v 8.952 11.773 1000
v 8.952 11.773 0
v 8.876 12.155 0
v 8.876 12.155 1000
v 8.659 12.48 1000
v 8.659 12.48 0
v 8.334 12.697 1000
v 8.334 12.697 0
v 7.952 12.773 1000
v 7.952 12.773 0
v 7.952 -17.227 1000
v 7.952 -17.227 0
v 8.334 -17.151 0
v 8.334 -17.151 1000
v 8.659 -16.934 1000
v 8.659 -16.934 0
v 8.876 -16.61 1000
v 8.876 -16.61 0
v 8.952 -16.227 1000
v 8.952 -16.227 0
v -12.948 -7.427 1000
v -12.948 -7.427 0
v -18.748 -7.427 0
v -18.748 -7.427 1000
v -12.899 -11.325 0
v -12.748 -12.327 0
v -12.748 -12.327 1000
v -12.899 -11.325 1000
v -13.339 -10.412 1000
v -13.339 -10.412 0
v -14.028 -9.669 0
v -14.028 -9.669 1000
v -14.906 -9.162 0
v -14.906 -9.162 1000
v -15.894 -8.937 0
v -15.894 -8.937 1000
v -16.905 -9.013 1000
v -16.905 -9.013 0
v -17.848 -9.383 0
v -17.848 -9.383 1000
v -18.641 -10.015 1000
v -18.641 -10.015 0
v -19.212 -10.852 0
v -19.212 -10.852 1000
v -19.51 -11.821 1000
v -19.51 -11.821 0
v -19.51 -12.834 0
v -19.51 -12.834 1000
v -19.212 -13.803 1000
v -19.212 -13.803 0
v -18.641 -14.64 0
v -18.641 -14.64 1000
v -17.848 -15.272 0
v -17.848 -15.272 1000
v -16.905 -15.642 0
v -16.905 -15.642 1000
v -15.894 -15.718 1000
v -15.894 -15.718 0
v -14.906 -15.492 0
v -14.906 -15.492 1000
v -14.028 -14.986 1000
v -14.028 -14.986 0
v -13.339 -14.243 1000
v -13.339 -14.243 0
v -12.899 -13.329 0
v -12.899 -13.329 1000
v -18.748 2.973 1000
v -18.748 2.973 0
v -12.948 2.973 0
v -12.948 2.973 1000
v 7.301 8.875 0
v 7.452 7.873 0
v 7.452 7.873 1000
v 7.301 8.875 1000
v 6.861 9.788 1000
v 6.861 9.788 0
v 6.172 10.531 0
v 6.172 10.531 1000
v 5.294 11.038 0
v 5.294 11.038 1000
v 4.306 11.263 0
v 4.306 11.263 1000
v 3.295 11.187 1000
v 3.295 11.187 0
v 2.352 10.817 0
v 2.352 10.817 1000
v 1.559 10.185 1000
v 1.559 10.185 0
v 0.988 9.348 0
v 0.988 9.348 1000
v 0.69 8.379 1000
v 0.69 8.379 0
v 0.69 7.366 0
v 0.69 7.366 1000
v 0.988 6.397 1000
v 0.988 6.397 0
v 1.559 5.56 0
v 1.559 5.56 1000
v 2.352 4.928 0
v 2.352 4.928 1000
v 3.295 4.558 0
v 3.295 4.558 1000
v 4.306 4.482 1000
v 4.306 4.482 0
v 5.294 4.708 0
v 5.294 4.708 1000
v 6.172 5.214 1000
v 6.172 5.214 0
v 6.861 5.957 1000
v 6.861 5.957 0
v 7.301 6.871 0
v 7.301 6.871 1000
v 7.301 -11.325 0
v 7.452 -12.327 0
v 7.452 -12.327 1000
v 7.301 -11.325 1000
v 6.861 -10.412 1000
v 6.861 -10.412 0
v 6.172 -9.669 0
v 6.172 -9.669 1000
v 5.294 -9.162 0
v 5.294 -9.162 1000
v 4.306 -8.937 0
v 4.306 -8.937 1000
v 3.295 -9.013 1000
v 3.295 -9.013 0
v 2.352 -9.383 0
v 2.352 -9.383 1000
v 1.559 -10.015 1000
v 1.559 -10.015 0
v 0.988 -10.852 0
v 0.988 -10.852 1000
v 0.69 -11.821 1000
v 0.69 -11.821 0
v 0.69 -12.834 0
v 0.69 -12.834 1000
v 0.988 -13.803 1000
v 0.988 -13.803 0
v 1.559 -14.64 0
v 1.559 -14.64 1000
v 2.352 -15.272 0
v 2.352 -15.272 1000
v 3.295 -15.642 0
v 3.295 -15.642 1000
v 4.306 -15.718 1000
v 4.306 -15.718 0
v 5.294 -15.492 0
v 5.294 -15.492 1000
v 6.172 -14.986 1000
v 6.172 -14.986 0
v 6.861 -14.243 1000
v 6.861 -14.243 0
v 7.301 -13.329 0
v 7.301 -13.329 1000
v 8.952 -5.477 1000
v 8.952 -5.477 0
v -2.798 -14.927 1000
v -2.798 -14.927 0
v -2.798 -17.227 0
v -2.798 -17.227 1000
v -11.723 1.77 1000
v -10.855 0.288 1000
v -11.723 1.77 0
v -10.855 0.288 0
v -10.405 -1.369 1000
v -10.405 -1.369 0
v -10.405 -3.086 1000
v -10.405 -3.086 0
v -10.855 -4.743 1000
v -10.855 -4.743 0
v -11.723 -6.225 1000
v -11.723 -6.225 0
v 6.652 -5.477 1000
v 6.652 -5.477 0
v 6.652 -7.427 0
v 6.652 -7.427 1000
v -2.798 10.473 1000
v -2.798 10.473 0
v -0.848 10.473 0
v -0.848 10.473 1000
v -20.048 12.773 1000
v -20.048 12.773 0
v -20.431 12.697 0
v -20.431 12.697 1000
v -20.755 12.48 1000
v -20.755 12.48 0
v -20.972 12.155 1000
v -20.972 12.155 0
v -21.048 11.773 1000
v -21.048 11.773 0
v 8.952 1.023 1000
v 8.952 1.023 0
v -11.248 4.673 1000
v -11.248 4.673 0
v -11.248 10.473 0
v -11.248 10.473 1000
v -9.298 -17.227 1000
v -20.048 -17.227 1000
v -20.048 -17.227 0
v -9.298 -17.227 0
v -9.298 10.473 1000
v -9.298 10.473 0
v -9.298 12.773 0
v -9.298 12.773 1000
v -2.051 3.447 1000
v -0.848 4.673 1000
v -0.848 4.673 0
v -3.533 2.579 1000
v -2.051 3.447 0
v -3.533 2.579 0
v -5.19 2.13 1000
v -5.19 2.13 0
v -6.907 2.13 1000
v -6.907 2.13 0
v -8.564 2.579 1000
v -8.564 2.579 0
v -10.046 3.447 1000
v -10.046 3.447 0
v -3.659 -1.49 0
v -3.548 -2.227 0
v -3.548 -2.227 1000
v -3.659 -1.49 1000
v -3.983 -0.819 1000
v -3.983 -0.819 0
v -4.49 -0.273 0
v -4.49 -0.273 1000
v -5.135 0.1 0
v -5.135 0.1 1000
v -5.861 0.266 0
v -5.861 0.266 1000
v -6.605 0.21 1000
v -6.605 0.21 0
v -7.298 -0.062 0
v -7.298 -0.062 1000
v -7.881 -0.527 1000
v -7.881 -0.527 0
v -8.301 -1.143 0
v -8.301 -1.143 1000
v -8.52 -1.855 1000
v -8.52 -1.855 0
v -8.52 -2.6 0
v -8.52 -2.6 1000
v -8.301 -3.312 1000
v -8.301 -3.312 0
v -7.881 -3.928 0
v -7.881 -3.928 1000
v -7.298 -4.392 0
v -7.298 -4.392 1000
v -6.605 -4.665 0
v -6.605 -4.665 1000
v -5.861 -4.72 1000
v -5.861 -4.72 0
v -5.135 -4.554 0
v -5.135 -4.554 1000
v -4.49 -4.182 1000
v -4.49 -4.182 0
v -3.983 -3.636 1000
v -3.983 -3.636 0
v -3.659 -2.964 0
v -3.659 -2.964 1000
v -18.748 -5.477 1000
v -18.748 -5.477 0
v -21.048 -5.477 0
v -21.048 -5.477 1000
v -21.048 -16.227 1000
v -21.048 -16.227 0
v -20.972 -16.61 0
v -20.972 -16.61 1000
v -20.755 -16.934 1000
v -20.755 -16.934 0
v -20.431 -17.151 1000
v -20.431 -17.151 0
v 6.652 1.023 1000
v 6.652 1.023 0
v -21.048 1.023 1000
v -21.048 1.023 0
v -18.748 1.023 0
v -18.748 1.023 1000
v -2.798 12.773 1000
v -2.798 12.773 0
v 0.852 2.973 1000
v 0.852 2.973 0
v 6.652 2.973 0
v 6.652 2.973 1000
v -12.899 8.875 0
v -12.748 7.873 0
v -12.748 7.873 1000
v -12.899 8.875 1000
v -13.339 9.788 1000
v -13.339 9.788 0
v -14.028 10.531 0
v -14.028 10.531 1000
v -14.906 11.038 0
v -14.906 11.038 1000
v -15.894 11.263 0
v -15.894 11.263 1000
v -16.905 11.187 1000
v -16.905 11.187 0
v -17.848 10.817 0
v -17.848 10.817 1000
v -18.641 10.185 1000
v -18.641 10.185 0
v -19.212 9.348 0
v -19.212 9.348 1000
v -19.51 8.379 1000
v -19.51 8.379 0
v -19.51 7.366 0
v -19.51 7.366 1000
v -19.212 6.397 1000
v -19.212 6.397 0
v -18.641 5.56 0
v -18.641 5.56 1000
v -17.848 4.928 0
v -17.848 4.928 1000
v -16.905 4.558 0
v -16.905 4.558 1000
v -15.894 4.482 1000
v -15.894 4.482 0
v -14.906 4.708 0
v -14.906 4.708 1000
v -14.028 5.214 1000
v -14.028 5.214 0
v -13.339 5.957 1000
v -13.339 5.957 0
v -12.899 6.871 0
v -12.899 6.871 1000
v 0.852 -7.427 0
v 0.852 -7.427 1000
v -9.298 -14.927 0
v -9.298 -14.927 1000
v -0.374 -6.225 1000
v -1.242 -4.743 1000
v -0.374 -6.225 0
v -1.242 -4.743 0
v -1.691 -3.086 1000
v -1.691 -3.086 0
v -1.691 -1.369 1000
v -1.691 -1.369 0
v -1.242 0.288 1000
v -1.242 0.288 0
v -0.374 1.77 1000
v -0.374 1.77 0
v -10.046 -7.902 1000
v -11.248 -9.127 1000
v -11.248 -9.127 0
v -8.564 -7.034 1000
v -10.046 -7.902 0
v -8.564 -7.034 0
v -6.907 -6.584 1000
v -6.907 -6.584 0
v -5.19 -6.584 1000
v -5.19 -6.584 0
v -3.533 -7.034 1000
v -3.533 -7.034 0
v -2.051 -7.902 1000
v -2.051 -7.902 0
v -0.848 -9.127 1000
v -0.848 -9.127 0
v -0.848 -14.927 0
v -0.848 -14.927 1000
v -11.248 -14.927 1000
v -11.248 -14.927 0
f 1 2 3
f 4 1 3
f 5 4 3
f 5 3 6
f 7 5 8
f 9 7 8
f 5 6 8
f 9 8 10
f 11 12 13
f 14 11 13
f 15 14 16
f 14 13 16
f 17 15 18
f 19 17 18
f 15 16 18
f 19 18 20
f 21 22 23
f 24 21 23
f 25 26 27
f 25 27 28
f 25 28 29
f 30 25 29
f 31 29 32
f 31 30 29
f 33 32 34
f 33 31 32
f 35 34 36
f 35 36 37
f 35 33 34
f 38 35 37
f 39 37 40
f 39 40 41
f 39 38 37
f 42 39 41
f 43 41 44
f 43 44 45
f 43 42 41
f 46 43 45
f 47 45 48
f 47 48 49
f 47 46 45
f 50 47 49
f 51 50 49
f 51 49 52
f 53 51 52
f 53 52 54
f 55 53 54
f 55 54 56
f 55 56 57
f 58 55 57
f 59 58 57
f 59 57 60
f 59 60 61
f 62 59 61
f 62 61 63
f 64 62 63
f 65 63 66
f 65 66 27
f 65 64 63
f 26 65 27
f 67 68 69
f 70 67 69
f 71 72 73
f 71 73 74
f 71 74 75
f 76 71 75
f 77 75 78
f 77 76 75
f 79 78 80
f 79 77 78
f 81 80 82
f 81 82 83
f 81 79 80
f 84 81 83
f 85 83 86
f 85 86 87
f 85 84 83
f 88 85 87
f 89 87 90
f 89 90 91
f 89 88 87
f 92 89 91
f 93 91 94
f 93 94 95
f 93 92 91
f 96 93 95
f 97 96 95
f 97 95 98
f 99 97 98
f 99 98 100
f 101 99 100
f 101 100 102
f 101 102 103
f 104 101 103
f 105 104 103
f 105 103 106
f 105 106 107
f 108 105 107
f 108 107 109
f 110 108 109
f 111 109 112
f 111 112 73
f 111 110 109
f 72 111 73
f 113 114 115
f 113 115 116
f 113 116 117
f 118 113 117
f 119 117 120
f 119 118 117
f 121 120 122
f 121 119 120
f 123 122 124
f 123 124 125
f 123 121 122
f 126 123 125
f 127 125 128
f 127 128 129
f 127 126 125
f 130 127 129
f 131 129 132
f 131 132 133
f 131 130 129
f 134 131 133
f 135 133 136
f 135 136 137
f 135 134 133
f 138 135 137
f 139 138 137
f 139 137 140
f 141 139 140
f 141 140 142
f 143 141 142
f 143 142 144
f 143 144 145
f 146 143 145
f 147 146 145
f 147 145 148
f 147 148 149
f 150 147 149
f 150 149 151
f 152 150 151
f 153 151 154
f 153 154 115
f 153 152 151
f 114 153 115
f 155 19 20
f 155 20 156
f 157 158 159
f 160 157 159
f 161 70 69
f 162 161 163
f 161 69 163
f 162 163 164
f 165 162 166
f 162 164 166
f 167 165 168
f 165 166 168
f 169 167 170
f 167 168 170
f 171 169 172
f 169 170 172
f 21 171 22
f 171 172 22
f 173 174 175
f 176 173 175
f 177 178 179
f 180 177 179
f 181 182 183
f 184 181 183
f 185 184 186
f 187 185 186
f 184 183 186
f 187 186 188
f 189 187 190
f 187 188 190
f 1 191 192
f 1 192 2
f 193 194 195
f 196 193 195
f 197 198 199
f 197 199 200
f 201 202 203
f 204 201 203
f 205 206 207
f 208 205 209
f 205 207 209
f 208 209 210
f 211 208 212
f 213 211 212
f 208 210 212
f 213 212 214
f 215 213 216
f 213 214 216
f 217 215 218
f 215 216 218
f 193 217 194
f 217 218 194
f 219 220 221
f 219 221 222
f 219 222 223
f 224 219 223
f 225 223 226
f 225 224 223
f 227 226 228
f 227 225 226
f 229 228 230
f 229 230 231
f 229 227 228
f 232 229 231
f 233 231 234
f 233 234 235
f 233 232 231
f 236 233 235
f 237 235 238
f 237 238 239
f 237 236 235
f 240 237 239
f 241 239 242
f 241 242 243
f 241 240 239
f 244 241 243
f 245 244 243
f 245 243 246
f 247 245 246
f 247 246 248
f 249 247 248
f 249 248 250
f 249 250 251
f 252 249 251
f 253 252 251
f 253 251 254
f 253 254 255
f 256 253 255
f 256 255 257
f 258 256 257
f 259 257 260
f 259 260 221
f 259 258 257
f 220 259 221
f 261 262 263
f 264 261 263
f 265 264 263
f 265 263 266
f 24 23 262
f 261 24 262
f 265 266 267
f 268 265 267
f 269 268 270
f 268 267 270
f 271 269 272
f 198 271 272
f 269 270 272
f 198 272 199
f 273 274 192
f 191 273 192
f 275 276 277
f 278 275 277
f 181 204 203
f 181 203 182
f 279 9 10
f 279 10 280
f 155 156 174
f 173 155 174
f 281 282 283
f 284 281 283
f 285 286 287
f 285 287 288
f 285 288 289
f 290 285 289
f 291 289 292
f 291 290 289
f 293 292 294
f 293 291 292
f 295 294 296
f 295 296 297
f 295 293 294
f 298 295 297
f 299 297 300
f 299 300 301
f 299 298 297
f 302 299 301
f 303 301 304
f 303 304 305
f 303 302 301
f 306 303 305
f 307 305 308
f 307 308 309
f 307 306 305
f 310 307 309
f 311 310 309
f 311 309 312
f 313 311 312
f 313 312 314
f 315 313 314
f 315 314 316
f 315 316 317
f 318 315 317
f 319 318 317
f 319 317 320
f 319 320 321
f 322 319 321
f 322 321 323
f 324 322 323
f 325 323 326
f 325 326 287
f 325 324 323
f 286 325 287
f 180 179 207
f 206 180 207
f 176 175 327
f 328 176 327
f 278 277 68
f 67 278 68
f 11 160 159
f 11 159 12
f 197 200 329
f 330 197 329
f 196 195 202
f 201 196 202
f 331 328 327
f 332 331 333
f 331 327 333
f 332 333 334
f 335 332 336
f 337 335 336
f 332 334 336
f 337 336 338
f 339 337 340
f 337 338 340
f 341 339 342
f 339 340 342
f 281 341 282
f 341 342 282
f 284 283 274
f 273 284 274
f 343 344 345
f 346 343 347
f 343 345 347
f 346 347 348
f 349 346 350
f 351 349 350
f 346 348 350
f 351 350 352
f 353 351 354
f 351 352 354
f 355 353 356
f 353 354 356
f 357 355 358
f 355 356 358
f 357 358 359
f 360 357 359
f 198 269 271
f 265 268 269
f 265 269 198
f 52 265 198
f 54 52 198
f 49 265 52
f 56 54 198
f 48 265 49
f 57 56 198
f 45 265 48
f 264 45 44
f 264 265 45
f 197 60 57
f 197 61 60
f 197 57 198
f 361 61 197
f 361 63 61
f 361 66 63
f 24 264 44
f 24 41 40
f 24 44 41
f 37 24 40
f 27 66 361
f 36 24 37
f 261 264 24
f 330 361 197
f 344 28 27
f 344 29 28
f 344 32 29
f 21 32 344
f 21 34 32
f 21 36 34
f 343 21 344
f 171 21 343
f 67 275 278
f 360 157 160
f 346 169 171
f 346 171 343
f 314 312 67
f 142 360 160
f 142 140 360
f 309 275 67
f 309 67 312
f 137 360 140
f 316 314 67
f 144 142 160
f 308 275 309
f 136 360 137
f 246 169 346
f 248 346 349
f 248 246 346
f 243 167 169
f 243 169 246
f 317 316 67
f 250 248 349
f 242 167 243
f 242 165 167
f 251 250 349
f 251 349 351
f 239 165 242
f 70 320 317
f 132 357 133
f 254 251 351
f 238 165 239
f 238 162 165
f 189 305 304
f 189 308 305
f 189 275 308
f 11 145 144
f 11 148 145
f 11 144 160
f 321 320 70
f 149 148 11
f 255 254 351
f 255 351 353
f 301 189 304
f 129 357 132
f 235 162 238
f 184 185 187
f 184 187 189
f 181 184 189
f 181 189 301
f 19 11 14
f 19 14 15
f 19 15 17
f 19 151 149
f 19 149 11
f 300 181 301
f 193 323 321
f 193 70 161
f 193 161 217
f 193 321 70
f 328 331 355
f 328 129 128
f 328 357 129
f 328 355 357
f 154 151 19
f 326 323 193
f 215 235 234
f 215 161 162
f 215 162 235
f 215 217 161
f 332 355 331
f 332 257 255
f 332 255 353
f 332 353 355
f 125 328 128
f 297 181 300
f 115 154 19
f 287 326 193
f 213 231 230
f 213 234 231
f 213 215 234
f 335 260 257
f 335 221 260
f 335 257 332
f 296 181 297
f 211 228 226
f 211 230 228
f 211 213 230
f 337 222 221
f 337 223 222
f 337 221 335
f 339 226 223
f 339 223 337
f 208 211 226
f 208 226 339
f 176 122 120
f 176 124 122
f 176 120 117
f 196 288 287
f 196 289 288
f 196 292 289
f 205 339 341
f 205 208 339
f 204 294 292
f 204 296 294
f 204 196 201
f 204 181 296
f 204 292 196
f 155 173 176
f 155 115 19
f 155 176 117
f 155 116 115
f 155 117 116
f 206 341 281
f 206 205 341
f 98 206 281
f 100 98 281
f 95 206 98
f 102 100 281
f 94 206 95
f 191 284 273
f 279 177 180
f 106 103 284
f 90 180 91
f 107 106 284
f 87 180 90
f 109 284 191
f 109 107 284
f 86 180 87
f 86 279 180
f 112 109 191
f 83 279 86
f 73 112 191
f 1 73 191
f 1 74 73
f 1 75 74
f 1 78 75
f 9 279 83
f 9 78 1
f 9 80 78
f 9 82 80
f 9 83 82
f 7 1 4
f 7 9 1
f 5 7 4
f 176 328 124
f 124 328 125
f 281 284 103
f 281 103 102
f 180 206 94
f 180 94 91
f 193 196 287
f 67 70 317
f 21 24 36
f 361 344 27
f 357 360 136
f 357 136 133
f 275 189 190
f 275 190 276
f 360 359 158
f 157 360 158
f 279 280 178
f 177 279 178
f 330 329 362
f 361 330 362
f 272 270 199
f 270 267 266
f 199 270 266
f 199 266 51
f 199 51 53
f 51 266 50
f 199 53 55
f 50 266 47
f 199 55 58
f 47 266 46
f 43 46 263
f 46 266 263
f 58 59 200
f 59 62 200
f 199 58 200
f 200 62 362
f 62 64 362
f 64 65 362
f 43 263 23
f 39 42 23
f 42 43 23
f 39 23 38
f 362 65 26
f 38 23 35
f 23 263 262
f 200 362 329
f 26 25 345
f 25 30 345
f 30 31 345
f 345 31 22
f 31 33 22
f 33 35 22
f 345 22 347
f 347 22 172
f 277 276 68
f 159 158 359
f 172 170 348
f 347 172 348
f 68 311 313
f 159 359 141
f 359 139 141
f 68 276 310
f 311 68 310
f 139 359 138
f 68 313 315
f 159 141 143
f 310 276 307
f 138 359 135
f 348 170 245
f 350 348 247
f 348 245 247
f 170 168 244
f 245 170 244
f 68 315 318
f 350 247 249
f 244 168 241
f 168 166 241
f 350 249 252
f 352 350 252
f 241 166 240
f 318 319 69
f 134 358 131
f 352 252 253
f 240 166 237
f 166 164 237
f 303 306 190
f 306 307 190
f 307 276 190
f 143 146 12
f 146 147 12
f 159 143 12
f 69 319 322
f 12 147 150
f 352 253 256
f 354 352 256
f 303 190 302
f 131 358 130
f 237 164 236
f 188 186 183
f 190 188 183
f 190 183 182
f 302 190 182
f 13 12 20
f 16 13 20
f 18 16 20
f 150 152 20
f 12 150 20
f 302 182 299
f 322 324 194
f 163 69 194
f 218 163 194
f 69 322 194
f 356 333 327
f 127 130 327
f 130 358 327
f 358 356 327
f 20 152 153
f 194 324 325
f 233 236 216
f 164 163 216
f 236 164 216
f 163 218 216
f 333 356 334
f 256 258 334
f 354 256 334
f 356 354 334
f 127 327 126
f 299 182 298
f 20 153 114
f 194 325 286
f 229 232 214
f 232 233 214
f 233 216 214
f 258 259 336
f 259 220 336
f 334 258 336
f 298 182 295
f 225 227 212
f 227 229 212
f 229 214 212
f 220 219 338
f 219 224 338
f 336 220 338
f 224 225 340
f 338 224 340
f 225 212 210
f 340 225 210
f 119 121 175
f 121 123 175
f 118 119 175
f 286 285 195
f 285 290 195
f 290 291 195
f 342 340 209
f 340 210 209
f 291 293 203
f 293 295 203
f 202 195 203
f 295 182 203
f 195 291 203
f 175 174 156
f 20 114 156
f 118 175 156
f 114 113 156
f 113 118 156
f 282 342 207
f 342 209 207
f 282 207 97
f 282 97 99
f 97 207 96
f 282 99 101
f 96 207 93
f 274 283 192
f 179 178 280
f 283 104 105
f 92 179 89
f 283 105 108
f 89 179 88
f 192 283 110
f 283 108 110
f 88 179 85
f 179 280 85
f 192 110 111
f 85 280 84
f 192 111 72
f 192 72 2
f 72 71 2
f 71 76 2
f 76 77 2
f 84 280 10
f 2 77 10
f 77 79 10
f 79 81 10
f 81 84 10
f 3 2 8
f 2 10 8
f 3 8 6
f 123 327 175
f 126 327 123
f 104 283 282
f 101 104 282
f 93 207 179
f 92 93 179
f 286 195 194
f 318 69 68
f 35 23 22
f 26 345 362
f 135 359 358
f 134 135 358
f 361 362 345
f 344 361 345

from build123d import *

# Parameters (mm, degrees)
SKETCH_1_R      = 2.5
SKETCH_1_R_2    = 3.4
EXTRUDE_1_DEPTH = 1000


with BuildPart() as part:
    # 草图1 → 凸台-拉伸1 (new body)
    with BuildSketch(Plane.XY):
        with BuildLine():
            Line((-2.798233949, -17.227303989), (7.951766051, -17.227303989))
            ThreePointArc((7.951766051, -17.227303989), (8.658872832, -16.93441077), (8.951766051, -16.227303989))
            Line((8.951766051, -16.227303989), (8.951766051, -5.477303989))
            Line((8.951766051, -5.477303989), (6.651766051, -5.477303989))
            Line((6.651766051, -5.477303989), (6.651766051, -7.427303989))
            Line((6.651766051, -7.427303989), (0.851766051, -7.427303989))
            ThreePointArc((0.851766051, -7.427303989), (-1.748233949, -2.227303989), (0.851766051, 2.972696011))
            Line((0.851766051, 2.972696011), (6.651766051, 2.972696011))
            Line((6.651766051, 2.972696011), (6.651766051, 1.022696011))
            Line((6.651766051, 1.022696011), (8.951766051, 1.022696011))
            Line((8.951766051, 1.022696011), (8.951766051, 11.772696011))
            ThreePointArc((8.951766051, 11.772696011), (8.658872832, 12.479802792), (7.951766051, 12.772696011))
            Line((7.951766051, 12.772696011), (-2.798233949, 12.772696011))
            Line((-2.798233949, 12.772696011), (-2.798233949, 10.472696011))
            Line((-2.798233949, 10.472696011), (-0.848233949, 10.472696011))
            Line((-0.848233949, 10.472696011), (-0.848233949, 4.672696011))
            ThreePointArc((-0.848233949, 4.672696011), (-6.048233949, 2.072696011), (-11.248233949, 4.672696011))
            Line((-11.248233949, 4.672696011), (-11.248233949, 10.472696011))
            Line((-11.248233949, 10.472696011), (-9.298233949, 10.472696011))
            Line((-9.298233949, 10.472696011), (-9.298233949, 12.772696011))
            Line((-9.298233949, 12.772696011), (-20.048233949, 12.772696011))
            ThreePointArc((-20.048233949, 12.772696011), (-20.75534073, 12.479802792), (-21.048233949, 11.772696011))
            Line((-21.048233949, 11.772696011), (-21.048233949, 1.022696011))
            Line((-21.048233949, 1.022696011), (-18.748233949, 1.022696011))
            Line((-18.748233949, 1.022696011), (-18.748233949, 2.972696011))
            Line((-18.748233949, 2.972696011), (-12.948233949, 2.972696011))
            ThreePointArc((-12.948233949, 2.972696011), (-10.348233949, -2.227303989), (-12.948233949, -7.427303989))
            Line((-12.948233949, -7.427303989), (-18.748233949, -7.427303989))
            Line((-18.748233949, -7.427303989), (-18.748233949, -5.477303989))
            Line((-18.748233949, -5.477303989), (-21.048233949, -5.477303989))
            Line((-21.048233949, -5.477303989), (-21.048233949, -16.227303989))
            ThreePointArc((-21.048233949, -16.227303989), (-20.75534073, -16.93441077), (-20.048233949, -17.227303989))
            Line((-20.048233949, -17.227303989), (-9.298233949, -17.227303989))
            Line((-9.298233949, -17.227303989), (-9.298233949, -14.927303989))
            Line((-9.298233949, -14.927303989), (-11.248233949, -14.927303989))
            Line((-11.248233949, -14.927303989), (-11.248233949, -9.127303989))
            ThreePointArc((-11.248233949, -9.127303989), (-6.048233949, -6.527303989), (-0.848233949, -9.127303989))
            Line((-0.848233949, -9.127303989), (-0.848233949, -14.927303989))
            Line((-0.848233949, -14.927303989), (-2.798233949, -14.927303989))
            Line((-2.798233949, -14.927303989), (-2.798233949, -17.227303989))
        make_face()
        with Locations((-6.048233949, -2.227303989)):
            Circle(SKETCH_1_R, mode=Mode.SUBTRACT)
        with Locations((-16.148233949, -12.327303989)):
            Circle(SKETCH_1_R_2, mode=Mode.SUBTRACT)
        with Locations((4.051766051, -12.327303989)):
            Circle(SKETCH_1_R_2, mode=Mode.SUBTRACT)
        with Locations((4.051766051, 7.872696011)):
            Circle(SKETCH_1_R_2, mode=Mode.SUBTRACT)
        with Locations((-16.148233949, 7.872696011)):
            Circle(SKETCH_1_R_2, mode=Mode.SUBTRACT)
    extrude(amount=EXTRUDE_1_DEPTH)


solid = part.part
